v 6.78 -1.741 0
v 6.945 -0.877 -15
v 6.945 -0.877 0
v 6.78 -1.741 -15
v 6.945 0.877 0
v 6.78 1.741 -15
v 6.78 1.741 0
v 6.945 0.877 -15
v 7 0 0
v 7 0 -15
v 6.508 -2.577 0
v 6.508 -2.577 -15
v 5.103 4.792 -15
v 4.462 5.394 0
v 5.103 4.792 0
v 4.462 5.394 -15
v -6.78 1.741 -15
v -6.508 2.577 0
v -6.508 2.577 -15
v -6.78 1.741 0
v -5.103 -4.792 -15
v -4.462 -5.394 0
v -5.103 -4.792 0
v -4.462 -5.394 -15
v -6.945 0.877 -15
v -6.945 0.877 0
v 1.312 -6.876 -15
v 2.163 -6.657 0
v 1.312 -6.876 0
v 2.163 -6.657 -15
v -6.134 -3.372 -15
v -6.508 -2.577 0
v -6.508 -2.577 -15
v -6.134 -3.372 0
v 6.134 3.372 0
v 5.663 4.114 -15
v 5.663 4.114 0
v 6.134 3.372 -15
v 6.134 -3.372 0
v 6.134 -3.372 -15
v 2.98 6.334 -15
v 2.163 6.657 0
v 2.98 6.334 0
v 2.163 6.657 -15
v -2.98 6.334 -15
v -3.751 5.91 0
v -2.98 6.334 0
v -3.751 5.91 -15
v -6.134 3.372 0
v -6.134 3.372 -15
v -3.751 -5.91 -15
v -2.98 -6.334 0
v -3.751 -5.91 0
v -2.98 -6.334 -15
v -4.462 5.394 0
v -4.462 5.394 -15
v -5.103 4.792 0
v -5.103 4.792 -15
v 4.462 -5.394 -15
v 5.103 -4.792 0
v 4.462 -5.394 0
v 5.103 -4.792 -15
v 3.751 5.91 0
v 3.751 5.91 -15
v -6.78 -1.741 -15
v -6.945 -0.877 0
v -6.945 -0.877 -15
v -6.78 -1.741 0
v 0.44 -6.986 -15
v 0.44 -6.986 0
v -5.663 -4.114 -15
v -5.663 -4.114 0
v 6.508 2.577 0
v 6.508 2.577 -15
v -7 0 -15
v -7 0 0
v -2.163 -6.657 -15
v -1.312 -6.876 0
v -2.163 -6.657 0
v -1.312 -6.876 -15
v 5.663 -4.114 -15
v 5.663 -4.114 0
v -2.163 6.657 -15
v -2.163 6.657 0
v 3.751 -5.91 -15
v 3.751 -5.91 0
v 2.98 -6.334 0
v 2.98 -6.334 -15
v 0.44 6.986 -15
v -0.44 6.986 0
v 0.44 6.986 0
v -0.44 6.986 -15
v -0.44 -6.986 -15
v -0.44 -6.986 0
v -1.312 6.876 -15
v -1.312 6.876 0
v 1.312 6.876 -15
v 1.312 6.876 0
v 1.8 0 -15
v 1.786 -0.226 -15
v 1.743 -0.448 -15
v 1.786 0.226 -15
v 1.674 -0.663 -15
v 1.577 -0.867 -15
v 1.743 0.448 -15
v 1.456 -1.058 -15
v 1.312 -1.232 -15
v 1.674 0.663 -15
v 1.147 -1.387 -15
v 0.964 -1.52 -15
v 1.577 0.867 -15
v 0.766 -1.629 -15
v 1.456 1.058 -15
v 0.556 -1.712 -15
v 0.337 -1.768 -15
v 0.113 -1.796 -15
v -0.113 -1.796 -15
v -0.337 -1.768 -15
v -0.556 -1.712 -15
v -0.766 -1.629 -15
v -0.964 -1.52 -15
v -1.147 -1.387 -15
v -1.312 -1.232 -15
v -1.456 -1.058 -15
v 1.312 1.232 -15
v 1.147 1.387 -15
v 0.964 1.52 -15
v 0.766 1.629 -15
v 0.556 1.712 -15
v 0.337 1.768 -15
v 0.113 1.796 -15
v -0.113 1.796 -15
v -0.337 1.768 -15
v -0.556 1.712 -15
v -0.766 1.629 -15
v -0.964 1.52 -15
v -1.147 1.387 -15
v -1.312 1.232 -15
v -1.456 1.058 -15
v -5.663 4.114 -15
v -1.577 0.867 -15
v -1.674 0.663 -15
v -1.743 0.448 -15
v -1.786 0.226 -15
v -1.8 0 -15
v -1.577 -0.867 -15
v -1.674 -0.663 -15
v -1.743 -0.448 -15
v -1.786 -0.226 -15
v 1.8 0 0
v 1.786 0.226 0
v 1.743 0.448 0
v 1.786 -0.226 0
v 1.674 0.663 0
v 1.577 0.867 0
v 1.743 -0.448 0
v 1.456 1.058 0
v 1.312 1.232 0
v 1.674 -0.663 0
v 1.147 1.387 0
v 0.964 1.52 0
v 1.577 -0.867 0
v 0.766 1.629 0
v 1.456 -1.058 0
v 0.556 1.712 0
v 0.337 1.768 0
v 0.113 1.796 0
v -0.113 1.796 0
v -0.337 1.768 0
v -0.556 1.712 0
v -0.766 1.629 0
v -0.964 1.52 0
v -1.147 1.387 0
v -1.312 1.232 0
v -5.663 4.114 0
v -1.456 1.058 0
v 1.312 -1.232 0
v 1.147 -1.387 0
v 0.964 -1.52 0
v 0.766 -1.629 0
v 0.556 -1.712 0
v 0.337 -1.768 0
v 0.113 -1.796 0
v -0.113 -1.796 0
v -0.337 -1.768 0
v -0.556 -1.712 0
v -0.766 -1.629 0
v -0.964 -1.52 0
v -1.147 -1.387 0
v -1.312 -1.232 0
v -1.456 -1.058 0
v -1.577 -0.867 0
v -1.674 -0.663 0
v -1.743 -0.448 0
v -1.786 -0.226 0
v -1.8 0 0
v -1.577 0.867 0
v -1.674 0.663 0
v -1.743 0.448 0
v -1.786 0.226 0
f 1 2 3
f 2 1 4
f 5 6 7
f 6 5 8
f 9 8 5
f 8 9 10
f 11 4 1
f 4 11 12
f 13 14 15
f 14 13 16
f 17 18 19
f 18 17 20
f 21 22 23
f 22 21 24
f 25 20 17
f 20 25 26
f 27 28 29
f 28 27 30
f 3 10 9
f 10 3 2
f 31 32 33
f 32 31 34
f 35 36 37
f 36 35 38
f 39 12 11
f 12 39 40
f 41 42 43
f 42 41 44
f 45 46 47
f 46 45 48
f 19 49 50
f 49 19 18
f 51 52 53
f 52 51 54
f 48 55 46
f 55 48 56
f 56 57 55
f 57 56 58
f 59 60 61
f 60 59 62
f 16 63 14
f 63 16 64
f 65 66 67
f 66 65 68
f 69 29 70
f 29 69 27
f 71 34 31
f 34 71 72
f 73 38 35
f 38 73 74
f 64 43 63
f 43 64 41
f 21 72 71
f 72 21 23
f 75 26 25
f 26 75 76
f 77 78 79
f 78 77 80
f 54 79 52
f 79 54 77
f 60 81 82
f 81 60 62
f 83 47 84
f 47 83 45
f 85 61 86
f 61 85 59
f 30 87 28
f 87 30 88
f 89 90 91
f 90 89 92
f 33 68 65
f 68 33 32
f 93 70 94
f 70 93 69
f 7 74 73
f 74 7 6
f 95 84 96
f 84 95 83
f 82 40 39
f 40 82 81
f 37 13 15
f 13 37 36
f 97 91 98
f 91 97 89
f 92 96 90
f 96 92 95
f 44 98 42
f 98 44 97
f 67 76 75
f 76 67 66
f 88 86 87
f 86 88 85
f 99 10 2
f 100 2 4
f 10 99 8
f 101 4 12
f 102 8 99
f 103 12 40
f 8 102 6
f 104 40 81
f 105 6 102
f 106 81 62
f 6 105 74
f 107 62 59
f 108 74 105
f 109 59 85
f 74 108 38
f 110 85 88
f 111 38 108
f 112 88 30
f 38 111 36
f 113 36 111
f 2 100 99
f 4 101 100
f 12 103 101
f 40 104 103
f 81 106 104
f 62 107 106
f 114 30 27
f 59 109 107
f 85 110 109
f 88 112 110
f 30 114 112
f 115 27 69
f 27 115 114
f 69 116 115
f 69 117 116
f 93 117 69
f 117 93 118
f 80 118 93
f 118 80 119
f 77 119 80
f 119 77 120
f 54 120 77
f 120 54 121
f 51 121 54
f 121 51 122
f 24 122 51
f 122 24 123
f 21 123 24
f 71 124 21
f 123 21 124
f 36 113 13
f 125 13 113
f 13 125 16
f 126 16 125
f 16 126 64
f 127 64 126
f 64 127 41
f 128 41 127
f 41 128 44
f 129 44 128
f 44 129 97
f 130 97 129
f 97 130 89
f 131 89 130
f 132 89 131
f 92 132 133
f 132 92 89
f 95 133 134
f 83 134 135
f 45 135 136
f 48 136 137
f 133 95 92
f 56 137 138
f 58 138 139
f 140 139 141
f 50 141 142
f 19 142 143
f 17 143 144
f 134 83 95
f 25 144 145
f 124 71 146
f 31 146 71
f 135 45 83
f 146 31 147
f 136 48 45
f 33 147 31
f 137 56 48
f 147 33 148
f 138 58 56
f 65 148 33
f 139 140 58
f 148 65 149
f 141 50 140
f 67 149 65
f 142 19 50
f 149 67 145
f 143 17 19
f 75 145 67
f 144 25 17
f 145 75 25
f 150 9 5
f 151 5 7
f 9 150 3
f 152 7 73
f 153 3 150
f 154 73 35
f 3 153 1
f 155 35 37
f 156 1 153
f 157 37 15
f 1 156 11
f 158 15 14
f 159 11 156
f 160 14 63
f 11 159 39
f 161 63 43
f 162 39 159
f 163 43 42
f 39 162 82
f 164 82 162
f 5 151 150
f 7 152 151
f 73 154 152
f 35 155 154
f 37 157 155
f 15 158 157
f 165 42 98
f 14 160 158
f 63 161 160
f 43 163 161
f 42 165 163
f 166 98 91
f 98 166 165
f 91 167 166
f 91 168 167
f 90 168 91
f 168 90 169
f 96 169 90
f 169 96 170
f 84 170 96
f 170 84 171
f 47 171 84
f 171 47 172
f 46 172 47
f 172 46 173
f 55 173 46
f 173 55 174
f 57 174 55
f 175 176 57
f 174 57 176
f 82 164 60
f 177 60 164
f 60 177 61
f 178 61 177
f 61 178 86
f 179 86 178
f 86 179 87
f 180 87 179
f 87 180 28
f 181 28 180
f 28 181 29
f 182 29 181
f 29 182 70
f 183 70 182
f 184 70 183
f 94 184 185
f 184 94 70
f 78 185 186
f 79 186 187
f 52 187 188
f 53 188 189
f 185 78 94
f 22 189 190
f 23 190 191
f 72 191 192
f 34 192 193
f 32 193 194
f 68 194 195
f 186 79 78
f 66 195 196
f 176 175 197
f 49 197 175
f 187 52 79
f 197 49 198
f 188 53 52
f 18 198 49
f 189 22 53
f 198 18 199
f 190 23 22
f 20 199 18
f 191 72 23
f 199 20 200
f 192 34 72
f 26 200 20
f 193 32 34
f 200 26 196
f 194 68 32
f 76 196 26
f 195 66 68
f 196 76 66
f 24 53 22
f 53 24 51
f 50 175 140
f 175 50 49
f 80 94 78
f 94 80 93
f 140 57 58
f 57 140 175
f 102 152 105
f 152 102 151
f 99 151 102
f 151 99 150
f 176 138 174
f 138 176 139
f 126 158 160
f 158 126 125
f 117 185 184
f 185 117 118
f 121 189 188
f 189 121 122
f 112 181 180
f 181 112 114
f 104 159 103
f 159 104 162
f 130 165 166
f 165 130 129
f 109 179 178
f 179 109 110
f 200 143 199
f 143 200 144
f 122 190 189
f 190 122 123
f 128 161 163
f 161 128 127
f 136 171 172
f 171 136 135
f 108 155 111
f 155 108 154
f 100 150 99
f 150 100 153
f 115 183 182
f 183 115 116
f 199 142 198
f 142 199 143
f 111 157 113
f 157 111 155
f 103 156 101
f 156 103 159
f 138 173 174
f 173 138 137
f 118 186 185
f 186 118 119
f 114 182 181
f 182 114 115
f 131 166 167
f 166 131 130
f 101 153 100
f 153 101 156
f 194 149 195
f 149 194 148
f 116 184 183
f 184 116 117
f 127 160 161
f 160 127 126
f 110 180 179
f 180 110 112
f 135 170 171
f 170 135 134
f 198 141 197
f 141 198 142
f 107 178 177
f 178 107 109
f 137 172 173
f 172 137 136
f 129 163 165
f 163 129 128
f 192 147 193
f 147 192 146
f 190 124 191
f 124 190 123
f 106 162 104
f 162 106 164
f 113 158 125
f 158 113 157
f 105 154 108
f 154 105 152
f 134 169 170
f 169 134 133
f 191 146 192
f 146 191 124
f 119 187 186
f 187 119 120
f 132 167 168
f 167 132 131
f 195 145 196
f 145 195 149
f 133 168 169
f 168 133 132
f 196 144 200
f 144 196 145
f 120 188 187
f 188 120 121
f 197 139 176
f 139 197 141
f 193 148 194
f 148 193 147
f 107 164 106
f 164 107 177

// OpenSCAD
$fn = 50;


difference() {
	union() {
		translate(v = [0, 0, -15.0000000000]) {
			cylinder(h = 15, r = 7.0000000000);
		}
		cylinder(h = 0, r = 16.0000000000);
	}
	union() {
		#translate(v = [0, 0, -15]) {
			cylinder(h = 15, r = 1.8000000000);
		}
	}
}
